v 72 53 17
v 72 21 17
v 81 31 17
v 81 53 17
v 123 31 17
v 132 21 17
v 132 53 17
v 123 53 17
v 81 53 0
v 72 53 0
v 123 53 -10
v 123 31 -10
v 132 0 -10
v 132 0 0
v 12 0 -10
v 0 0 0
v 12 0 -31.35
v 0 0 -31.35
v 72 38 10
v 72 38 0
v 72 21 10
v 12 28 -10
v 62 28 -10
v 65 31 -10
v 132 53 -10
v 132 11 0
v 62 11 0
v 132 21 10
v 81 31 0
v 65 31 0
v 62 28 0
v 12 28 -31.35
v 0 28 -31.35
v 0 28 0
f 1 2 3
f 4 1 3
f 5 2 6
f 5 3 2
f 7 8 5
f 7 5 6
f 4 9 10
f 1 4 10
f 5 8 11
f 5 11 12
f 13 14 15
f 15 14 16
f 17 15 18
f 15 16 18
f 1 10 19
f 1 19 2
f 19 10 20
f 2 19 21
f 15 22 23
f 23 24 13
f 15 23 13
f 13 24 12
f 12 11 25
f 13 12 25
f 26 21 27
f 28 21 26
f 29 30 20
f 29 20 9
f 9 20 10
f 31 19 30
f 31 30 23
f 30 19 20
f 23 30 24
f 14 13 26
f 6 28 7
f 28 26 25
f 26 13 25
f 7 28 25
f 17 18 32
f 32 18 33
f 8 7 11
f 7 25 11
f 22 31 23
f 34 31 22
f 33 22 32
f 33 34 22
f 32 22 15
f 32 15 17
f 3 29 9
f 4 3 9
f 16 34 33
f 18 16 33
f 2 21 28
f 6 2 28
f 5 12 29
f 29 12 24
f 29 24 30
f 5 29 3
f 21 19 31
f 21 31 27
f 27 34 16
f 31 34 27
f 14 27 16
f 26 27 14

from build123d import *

# Parameters (mm, degrees)
SKETCH1_W           = 31.35
SKETCH1_H           = 28
BOSS_EXTRUDE1_DEPTH = 12
SKETCH2_W           = 10
SKETCH2_H           = 28
BOSS_EXTRUDE2_DEPTH = 120
SKETCH3_W           = 60
SKETCH3_H           = 25
BOSS_EXTRUDE3_DEPTH = 10
SKETCH4_W           = 42
SKETCH4_H           = 22
CUT_EXTRUDE1_DEPTH  = 146.656522339
BOSS_EXTRUDE4_DEPTH = 17
CHAMFER1_SIZE       = 10
SKETCH6_W           = 10
SKETCH6_H           = 22
CUT_EXTRUDE2_DEPTH  = 9
CHAMFER2_SIZE       = 10


with BuildPart() as part:
    # Sketch1 → Boss-Extrude1 (new body)
    with BuildSketch(Plane(origin=(0, 0, 0), x_dir=(0, 0, -1), z_dir=(1, 0, 0))):
        with Locations((15.675, 14)):
            Rectangle(SKETCH1_W, SKETCH1_H)
    extrude(amount=BOSS_EXTRUDE1_DEPTH)

    # Sketch2 → Boss-Extrude2 (add)
    with BuildSketch(Plane(origin=(12, 0, 0), x_dir=(0, 0, -1), z_dir=(1, 0, 0))):
        with Locations((5, 14)):
            Rectangle(SKETCH2_W, SKETCH2_H)
    extrude(amount=BOSS_EXTRUDE2_DEPTH)

    # Sketch3 → Boss-Extrude3 (add)
    with BuildSketch(Plane.XY):
        with Locations((102, 40.5)):
            Rectangle(SKETCH3_W, SKETCH3_H)
    extrude(amount=-BOSS_EXTRUDE3_DEPTH)

    # Sketch4 → Cut-Extrude1 (cut, through all)
    with BuildSketch(Plane.XY):
        with Locations((102, 42)):
            Rectangle(SKETCH4_W, SKETCH4_H)
    extrude(amount=-CUT_EXTRUDE1_DEPTH, mode=Mode.SUBTRACT)

    # Sketch5 → Boss-Extrude4 (add)
    with BuildSketch(Plane.XY):
        Polygon((81, 31), (81, 53), (72, 53), (72, 28), (72, 21), (132, 21), (132, 53), (123, 53), (123, 31), align=None)
    extrude(amount=BOSS_EXTRUDE4_DEPTH)

    # Chamfer1
    chamfer1_edges = [part.edges().sort_by_distance(p)[0] for p in [
        (72, 24.5, 0),
        (102, 21, 0),
    ]]
    chamfer(chamfer1_edges, length=CHAMFER1_SIZE)

    # Sketch6 → Cut-Extrude2 (cut)
    with BuildSketch(Plane.ZY.offset(-72)):
        with Locations((-5, 42)):
            Rectangle(SKETCH6_W, SKETCH6_H)
    extrude(amount=-CUT_EXTRUDE2_DEPTH, mode=Mode.SUBTRACT)

    # Chamfer2
    chamfer2_edges = [part.edges().sort_by_distance(p)[0] for p in [
        (72, 28, 0),
    ]]
    chamfer(chamfer2_edges, length=CHAMFER2_SIZE - 0.0001)  # a hair under: the kernel refuses the full size


solid = part.part
